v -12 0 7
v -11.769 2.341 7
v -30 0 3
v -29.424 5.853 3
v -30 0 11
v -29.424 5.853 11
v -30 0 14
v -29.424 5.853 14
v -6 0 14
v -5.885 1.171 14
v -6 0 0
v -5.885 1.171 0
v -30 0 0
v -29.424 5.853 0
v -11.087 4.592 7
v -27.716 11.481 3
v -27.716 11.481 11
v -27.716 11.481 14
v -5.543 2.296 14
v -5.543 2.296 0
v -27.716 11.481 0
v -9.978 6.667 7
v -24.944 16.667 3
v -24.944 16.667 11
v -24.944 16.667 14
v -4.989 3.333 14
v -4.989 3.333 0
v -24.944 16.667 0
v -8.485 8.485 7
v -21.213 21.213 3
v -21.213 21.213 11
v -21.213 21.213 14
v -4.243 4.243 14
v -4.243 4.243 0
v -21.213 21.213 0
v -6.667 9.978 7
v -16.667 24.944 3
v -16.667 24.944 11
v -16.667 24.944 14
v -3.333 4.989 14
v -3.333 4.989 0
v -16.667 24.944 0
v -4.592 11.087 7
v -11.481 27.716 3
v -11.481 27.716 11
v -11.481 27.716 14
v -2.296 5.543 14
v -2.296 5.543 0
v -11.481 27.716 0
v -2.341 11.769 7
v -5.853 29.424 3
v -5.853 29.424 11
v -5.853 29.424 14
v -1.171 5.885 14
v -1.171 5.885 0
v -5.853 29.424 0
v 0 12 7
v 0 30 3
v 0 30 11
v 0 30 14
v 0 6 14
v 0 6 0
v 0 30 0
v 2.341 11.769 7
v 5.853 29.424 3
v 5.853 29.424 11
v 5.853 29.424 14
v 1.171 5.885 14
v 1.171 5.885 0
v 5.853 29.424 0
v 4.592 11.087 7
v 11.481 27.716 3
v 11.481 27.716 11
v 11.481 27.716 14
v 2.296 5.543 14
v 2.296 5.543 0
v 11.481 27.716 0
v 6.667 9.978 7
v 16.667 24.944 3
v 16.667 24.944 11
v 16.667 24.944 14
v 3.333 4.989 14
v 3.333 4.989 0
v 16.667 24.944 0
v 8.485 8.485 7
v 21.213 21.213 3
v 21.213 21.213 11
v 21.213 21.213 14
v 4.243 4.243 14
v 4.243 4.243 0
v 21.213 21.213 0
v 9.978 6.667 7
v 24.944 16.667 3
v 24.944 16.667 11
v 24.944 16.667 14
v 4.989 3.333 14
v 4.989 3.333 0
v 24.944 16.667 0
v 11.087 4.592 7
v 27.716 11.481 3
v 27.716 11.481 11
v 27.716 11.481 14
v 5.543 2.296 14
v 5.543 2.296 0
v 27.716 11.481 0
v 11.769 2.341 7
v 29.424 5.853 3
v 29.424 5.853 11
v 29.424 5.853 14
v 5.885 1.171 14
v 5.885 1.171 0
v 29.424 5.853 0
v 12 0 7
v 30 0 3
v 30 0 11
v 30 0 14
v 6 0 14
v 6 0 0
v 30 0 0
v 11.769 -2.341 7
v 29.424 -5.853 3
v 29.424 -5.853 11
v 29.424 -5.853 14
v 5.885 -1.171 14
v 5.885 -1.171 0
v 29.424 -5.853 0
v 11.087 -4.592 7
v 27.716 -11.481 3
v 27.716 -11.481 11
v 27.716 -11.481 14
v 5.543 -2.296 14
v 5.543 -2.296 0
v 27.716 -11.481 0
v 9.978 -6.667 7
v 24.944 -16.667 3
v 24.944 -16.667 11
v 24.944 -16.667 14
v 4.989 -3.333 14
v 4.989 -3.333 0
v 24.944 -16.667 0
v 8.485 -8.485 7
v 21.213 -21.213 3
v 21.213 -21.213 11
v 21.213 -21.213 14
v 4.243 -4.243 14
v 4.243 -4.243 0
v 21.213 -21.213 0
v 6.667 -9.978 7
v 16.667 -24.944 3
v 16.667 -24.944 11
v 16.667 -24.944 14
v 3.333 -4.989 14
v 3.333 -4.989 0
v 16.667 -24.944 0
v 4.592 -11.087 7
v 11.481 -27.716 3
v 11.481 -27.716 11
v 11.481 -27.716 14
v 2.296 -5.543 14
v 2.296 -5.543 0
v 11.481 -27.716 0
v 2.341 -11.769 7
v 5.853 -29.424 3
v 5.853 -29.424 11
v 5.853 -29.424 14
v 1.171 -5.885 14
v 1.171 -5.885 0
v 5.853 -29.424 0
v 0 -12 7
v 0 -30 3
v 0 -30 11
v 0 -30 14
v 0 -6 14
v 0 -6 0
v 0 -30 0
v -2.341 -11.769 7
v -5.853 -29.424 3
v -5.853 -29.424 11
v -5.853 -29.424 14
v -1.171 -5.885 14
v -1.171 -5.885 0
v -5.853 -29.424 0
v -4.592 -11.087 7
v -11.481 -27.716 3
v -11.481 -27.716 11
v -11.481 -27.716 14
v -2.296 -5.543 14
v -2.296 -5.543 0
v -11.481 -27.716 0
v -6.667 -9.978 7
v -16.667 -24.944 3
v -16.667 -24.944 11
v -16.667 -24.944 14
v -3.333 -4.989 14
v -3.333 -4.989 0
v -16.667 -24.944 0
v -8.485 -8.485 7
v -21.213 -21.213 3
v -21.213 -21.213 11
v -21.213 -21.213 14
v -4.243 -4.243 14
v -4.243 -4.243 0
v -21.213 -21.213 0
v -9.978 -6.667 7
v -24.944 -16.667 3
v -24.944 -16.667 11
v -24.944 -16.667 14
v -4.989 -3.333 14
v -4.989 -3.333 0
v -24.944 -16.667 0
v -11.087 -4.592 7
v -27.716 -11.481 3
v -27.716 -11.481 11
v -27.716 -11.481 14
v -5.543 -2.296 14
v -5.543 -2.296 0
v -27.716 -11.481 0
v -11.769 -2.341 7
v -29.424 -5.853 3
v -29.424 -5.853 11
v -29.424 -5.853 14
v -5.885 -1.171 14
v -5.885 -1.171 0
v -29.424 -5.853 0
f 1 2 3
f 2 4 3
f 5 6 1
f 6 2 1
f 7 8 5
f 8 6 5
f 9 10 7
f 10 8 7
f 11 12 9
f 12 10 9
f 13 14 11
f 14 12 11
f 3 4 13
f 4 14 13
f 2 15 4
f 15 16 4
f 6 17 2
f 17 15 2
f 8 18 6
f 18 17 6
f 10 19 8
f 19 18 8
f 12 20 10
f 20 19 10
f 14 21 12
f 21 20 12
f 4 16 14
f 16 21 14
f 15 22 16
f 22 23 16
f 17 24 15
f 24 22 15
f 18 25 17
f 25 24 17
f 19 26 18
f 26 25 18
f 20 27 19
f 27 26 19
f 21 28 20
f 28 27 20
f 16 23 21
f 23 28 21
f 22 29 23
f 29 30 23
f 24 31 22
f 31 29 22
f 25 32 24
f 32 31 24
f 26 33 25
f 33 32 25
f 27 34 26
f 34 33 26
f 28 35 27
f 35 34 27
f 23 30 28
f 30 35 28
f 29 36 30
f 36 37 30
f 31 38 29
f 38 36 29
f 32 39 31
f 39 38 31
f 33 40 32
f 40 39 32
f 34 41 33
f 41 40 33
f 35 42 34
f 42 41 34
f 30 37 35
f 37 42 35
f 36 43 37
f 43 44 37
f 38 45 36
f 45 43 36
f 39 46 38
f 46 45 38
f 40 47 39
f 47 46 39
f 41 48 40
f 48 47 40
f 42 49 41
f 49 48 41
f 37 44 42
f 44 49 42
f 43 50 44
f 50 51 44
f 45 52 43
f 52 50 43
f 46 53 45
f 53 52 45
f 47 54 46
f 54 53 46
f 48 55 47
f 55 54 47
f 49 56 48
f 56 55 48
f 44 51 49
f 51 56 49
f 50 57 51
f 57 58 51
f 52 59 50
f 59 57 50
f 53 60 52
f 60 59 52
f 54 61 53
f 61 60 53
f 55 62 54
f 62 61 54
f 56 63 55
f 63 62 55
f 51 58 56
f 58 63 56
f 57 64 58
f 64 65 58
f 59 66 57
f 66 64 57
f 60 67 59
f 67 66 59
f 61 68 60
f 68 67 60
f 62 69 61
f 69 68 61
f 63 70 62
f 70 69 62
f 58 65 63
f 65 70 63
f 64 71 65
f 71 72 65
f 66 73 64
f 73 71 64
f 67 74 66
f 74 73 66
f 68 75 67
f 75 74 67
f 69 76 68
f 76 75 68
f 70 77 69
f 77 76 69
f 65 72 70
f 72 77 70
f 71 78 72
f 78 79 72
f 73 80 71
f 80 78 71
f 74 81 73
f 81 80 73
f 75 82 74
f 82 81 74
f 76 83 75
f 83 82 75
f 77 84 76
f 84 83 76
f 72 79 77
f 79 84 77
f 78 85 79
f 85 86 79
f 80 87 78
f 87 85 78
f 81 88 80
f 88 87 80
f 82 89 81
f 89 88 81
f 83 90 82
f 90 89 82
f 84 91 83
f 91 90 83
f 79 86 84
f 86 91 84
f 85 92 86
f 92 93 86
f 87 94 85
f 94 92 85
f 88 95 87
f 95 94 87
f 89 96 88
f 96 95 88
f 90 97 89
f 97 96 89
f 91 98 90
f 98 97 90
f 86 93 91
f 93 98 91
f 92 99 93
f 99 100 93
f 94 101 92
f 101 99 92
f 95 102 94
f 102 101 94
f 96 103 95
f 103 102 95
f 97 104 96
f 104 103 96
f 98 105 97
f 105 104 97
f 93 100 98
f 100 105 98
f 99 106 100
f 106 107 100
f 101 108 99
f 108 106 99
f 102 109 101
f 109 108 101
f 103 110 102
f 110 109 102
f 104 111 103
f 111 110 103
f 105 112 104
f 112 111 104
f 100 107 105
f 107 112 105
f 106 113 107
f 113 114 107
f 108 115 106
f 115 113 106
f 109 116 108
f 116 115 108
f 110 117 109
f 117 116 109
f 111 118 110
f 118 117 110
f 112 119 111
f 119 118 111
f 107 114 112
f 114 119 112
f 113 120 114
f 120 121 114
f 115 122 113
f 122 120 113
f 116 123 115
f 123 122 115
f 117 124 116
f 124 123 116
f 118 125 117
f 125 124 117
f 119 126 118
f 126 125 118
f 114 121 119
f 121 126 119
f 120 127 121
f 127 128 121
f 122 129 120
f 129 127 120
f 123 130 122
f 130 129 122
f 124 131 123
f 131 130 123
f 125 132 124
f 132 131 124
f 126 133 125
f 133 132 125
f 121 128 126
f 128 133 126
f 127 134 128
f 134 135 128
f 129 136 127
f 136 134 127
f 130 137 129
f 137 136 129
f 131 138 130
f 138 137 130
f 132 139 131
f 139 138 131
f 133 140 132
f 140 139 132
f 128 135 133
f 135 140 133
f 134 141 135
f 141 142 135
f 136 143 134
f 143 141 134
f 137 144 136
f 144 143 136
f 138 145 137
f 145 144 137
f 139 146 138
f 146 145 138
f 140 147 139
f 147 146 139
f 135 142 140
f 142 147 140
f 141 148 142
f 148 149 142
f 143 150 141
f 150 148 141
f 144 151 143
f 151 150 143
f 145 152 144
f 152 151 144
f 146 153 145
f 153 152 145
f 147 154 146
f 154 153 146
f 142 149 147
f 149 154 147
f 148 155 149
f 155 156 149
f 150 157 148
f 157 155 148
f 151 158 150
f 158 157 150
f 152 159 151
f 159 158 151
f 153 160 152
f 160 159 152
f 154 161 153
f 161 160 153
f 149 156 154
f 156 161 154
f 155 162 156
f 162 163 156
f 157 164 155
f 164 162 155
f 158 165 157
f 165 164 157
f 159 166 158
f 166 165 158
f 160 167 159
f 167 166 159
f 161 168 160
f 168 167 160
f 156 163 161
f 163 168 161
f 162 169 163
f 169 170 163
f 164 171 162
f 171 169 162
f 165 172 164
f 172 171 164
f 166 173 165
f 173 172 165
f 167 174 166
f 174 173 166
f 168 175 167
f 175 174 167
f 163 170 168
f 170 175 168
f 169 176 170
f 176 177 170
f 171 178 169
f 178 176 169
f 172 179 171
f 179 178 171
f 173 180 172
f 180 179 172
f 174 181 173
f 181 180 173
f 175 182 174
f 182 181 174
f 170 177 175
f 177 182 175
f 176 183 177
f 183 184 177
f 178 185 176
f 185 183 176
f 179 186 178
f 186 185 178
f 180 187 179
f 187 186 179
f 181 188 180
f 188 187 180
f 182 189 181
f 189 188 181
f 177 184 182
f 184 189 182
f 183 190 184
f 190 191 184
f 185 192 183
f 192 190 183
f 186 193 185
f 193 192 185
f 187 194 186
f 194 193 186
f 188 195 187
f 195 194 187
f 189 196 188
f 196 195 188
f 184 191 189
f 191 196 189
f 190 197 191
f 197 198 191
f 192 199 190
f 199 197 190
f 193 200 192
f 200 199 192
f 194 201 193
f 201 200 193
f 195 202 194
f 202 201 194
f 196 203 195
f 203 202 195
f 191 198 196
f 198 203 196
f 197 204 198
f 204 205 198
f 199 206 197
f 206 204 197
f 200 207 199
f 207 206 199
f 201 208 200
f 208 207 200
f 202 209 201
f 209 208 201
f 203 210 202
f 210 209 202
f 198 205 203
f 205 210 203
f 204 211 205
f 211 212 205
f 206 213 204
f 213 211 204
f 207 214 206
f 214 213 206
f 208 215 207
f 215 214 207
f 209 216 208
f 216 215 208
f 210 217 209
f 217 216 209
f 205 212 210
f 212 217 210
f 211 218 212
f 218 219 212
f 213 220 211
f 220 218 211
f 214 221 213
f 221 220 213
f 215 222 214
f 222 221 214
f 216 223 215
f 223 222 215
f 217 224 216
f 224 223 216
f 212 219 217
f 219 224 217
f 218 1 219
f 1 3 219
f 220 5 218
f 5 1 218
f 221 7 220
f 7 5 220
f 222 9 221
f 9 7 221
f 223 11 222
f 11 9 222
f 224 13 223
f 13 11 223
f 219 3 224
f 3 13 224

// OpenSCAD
$fn = 32;

// ----------------------------------------------------------------------
// Revolved part: V-groove pulley R30
// ----------------------------------------------------------------------

// --- parameters (mm) ---
bore_r = 6;               // bore radius
rim_r = 30;               // rim radius
rim_t = 14;               // rim width
groove_r = 12;            // groove root radius
groove_w = 4;             // groove half width
revolve_angle = 360;      // revolve sweep, degrees

bore_d = 2 * bore_r;
rim_d = 2 * rim_r;
groove_d = 2 * groove_r;

profile = [[6, 0], [30, 0], [30, 3], [12, 7], [30, 11], [30, 14], [6, 14]];  // primary outline, 7 points, counter clockwise

// --- the one profile operation ---
rotate_extrude(angle = revolve_angle) polygon(points = profile);
